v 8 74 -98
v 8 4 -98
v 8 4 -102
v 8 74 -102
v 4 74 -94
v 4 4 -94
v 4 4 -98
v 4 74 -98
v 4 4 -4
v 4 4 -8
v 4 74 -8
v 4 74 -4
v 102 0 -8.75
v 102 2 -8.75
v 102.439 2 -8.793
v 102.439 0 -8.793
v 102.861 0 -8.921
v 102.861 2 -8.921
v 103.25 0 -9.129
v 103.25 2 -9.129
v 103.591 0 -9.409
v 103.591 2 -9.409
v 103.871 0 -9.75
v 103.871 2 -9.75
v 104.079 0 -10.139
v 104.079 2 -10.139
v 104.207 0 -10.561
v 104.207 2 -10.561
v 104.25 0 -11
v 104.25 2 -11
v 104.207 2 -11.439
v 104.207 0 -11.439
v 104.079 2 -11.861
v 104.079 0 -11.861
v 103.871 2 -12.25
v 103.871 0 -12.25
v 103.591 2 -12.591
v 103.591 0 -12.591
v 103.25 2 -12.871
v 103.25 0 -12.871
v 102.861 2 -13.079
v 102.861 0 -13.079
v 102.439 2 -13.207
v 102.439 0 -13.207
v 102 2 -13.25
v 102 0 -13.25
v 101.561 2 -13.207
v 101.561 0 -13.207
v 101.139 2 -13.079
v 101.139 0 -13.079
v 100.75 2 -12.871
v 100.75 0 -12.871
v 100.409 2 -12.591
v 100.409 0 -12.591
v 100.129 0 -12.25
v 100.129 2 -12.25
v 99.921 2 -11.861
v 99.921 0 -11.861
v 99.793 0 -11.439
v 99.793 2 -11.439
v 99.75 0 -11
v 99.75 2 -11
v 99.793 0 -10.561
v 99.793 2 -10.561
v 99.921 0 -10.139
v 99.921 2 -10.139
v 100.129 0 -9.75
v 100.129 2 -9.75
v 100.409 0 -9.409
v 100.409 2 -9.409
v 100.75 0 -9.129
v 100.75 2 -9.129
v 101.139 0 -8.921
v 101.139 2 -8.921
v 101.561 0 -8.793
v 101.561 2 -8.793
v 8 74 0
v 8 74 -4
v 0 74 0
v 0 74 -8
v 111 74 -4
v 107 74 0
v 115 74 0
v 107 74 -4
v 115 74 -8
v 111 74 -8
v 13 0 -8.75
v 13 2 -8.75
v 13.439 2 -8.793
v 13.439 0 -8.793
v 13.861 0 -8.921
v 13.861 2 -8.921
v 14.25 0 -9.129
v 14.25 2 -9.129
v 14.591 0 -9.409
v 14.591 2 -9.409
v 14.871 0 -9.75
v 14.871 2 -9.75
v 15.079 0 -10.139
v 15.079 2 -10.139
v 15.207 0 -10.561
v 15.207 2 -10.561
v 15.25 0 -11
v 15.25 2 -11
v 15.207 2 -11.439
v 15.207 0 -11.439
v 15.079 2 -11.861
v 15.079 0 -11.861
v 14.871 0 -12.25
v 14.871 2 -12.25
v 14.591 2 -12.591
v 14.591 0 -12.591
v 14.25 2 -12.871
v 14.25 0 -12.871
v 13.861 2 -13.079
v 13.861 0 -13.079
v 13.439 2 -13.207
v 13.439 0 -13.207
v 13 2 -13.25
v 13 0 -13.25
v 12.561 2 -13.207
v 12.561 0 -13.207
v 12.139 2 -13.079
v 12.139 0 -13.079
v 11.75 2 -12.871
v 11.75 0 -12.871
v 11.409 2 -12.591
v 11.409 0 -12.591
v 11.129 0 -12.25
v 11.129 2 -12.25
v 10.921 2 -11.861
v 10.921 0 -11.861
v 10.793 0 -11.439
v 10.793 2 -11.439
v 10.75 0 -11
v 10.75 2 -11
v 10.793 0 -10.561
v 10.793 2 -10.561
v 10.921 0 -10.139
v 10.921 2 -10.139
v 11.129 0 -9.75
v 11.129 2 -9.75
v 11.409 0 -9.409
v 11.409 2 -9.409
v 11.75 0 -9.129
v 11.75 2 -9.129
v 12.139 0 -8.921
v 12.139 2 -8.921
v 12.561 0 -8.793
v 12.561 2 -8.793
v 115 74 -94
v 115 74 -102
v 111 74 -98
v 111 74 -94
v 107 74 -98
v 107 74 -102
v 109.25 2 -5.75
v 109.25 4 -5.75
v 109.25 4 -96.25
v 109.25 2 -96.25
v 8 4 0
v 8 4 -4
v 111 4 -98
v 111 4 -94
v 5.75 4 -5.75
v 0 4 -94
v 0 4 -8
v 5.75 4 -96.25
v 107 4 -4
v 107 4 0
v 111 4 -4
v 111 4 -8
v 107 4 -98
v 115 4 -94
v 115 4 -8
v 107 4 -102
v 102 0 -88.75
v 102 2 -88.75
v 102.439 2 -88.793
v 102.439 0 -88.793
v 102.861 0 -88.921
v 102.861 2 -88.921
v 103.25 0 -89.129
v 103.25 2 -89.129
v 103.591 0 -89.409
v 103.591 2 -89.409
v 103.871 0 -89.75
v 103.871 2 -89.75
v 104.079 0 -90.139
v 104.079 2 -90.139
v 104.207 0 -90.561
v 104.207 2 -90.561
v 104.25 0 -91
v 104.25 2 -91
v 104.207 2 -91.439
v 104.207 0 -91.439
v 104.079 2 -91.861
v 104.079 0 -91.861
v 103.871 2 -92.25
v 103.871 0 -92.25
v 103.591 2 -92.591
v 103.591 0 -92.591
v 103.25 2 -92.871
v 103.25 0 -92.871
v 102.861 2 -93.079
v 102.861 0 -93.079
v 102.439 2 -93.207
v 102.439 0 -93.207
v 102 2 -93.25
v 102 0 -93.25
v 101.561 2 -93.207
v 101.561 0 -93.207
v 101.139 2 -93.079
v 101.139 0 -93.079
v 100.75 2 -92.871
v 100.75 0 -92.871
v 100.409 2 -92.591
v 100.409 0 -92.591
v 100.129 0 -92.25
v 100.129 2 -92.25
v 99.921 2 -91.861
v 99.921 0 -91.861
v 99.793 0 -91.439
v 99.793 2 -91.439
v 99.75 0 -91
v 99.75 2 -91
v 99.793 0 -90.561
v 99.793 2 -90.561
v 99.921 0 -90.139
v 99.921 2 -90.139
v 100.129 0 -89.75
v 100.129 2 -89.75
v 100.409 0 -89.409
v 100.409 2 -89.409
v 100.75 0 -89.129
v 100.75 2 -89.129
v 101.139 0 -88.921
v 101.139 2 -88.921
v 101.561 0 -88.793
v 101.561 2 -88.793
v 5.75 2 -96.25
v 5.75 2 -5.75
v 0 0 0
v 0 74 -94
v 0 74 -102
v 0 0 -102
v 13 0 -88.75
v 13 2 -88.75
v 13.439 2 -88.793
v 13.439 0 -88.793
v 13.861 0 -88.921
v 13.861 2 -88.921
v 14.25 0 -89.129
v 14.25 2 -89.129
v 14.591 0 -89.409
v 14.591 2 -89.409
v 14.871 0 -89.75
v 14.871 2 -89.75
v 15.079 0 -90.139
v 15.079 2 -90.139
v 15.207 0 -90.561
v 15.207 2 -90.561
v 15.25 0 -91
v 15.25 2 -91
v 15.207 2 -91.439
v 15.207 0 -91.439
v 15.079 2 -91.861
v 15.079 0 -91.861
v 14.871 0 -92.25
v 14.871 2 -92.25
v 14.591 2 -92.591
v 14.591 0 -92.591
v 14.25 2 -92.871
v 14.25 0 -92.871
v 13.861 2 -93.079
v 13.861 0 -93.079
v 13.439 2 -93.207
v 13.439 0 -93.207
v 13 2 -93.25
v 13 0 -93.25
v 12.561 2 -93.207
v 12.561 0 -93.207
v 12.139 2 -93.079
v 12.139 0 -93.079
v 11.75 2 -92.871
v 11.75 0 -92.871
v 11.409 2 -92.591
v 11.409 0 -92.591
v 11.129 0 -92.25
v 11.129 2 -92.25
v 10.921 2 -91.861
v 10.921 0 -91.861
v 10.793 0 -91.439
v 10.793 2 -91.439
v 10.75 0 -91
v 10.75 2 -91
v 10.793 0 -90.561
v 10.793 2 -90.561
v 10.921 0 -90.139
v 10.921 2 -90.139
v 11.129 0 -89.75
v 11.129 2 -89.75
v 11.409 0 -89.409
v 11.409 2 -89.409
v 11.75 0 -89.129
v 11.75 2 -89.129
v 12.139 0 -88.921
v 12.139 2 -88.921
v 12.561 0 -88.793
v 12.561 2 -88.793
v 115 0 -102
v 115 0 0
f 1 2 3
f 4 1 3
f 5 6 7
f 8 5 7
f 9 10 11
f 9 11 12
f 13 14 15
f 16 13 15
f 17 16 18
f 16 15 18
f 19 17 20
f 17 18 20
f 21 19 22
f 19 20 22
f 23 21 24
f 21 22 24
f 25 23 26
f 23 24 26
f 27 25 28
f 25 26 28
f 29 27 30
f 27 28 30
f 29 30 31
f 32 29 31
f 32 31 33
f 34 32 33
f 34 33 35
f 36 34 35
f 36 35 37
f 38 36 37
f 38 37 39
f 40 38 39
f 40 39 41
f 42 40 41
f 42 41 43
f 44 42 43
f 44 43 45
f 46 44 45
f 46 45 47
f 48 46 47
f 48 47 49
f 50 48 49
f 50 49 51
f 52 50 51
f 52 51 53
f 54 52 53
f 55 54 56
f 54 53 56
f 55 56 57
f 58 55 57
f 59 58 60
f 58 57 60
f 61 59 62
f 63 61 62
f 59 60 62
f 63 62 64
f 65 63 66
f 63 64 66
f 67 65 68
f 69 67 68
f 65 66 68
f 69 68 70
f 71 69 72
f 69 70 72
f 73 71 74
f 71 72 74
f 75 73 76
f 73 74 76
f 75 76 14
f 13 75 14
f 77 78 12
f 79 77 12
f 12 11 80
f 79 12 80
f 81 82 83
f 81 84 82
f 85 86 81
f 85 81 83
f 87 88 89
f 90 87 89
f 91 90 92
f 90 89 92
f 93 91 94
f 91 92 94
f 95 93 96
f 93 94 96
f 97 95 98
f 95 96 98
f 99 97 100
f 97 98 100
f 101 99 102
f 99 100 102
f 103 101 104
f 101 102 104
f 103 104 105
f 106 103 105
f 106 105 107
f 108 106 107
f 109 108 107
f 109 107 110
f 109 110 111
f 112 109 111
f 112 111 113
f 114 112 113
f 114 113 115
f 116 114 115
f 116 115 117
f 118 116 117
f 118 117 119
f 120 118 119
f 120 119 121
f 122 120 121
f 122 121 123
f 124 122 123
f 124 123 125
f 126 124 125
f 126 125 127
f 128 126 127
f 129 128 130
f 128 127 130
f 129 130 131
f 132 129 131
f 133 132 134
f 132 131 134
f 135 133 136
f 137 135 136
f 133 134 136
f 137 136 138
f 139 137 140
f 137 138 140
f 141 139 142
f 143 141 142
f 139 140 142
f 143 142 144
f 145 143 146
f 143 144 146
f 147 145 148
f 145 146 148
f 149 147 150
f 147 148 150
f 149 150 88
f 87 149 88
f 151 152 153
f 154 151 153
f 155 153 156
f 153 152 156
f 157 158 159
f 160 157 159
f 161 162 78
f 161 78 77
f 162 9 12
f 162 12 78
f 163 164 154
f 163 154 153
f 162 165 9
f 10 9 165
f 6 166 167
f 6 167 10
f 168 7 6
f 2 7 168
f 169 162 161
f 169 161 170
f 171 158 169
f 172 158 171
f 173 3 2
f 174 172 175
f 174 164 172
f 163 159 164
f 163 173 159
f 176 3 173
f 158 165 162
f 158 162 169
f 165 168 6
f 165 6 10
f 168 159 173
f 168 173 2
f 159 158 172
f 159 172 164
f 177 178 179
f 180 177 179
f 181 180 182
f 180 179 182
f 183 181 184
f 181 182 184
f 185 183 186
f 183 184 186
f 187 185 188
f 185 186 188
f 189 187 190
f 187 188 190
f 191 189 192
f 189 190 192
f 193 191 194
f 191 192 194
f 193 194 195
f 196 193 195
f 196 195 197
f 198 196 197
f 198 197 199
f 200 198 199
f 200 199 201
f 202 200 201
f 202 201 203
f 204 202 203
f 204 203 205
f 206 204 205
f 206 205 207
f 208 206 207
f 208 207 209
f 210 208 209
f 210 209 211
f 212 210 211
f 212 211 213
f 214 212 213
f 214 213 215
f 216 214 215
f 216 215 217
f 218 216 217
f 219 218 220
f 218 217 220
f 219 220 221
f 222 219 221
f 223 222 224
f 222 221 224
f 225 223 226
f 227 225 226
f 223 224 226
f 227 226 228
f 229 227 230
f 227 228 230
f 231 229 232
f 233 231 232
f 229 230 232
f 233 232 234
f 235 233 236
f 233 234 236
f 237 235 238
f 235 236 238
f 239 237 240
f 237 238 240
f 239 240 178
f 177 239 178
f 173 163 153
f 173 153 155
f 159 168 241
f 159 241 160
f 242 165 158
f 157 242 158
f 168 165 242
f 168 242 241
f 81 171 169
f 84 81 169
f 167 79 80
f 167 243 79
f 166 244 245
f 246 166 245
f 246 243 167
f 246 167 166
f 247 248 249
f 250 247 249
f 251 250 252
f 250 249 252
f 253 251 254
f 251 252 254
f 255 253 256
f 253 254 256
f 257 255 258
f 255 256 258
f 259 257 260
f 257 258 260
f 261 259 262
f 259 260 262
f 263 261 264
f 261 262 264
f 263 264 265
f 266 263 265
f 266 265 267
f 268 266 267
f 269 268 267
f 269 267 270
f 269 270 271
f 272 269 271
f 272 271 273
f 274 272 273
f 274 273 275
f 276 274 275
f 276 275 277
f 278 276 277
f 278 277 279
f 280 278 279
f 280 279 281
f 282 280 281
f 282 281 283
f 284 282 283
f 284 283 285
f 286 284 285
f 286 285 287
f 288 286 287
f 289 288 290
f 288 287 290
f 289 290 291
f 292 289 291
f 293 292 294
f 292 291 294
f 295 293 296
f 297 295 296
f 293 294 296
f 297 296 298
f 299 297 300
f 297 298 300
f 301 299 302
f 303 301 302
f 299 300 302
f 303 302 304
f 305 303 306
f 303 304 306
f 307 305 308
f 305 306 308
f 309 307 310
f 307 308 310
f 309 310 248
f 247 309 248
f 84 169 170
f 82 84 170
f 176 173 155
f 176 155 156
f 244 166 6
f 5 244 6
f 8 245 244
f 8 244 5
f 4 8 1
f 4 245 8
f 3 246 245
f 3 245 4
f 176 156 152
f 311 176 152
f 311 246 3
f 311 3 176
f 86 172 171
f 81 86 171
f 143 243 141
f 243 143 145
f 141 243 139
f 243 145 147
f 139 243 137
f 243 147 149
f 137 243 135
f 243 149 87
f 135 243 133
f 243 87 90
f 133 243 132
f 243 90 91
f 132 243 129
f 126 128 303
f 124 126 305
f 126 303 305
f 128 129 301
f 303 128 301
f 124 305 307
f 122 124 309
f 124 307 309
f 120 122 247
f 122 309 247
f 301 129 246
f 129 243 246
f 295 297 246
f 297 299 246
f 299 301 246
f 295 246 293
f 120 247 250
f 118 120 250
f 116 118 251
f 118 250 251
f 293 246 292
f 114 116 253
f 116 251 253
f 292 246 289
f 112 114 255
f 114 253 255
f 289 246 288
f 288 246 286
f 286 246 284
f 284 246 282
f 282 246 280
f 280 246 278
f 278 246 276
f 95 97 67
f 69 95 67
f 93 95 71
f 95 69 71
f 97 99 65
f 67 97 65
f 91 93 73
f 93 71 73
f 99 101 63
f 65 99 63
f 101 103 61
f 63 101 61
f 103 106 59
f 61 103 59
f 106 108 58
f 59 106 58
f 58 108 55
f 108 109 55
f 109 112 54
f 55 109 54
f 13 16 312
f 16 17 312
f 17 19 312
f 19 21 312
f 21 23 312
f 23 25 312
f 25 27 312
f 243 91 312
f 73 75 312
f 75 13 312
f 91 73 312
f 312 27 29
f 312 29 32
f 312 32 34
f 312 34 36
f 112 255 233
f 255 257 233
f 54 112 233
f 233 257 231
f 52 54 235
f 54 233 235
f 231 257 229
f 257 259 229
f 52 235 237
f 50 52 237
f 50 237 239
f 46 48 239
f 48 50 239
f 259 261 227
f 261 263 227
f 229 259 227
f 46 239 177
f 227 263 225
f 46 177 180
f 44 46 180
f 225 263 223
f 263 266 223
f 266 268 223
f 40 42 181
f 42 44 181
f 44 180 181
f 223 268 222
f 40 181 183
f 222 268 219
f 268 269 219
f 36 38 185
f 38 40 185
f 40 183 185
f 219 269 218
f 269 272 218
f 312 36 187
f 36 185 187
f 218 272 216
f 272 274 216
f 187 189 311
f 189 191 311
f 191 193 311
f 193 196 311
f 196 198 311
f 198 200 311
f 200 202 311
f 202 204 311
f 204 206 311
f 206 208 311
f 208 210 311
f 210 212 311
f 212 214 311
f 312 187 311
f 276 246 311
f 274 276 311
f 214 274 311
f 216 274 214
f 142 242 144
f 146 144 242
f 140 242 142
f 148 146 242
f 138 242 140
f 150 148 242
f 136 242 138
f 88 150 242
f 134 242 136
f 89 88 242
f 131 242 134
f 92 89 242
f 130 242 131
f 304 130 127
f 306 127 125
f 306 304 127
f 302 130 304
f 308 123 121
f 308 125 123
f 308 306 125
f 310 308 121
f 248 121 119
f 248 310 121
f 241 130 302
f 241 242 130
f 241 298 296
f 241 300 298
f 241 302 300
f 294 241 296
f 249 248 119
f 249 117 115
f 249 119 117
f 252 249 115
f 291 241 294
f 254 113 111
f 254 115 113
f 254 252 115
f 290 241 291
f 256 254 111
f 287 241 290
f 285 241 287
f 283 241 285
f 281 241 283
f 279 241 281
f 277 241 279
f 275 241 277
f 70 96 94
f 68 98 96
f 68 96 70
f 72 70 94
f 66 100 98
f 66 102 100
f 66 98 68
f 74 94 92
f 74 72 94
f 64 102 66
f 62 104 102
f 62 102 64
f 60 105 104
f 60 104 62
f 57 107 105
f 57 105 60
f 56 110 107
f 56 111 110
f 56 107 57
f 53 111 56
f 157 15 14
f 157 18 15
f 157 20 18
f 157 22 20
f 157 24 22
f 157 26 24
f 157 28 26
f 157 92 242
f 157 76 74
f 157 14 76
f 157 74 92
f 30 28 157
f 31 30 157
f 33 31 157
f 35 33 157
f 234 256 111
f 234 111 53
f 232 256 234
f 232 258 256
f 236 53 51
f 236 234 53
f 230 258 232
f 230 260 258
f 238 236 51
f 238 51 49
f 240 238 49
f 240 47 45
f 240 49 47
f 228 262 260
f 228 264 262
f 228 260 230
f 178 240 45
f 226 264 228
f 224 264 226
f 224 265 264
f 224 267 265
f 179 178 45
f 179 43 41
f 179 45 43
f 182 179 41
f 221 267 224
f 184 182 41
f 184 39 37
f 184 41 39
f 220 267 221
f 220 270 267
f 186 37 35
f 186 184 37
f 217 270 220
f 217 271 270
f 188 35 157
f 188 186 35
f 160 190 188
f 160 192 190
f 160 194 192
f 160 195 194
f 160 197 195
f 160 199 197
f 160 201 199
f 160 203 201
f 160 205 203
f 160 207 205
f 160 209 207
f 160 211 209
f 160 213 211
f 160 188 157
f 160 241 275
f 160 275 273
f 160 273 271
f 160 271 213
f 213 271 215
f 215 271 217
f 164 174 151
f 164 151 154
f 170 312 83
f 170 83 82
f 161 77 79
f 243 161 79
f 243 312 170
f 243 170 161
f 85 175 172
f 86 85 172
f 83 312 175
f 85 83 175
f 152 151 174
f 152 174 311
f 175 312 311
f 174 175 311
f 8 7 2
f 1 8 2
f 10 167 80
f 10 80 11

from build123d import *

# Parameters (mm, degrees)
SKETCH1_W           = 115
SKETCH1_H           = 102
BOSS_EXTRUDE1_DEPTH = 4
SKETCH11_W          = 103.5
SKETCH11_H          = 90.5
CUT_EXTRUDE5_DEPTH  = 2
SKETCH16_R          = 2.25
CUT_EXTRUDE7_DEPTH  = 13
BOSS_EXTRUDE4_DEPTH = 70


with BuildPart() as part:
    # Sketch1 → Boss-Extrude1 (new body)
    with BuildSketch(Plane(origin=(0, 0, 0), x_dir=(1, 0, 0), z_dir=(0, 1, 0))):
        with Locations((57.5, 51)):
            Rectangle(SKETCH1_W, SKETCH1_H)
    extrude(amount=BOSS_EXTRUDE1_DEPTH)

    # Sketch11 → Cut-Extrude5 (cut)
    with BuildSketch(Plane(origin=(0, 4, 0), x_dir=(1, 0, 0), z_dir=(0, 1, 0))):
        with Locations((57.5, 51)):
            Rectangle(SKETCH11_W, SKETCH11_H)
    extrude(amount=-CUT_EXTRUDE5_DEPTH, mode=Mode.SUBTRACT)

    # Sketch16 → Cut-Extrude7 (cut)
    with BuildSketch(Plane(origin=(0, 2, 0), x_dir=(1, 0, 0), z_dir=(0, 1, 0))):
        with Locations(Location((13, 11, 0), (0, 0, 270))):
            Circle(SKETCH16_R)
        with Locations(Location((13, 91, 0), (0, 0, 270))):
            Circle(SKETCH16_R)
        with Locations(Location((102, 91, 0), (0, 0, 270))):
            Circle(SKETCH16_R)
        with Locations(Location((102, 11, 0), (0, 0, 270))):
            Circle(SKETCH16_R)
    extrude(amount=-CUT_EXTRUDE7_DEPTH, mode=Mode.SUBTRACT)

    # Sketch6 → Boss-Extrude4 (add)
    with BuildSketch(Plane(origin=(0, 4, 0), x_dir=(1, 0, 0), z_dir=(0, 1, 0))):
        Polygon((0, 0), (0, 8), (4, 8), (4, 4), (8, 4), (8, 0), align=None)
        Polygon((107, 0), (115, 0), (115, 8), (111, 8), (111, 4), (107, 4), align=None)
        Polygon((107, 102), (115, 102), (115, 94), (111, 94), (111, 98), (107, 98), align=None)
        Polygon((8, 102), (0, 102), (0, 94), (4, 94), (4, 98), (8, 98), align=None)
    extrude(amount=BOSS_EXTRUDE4_DEPTH)


solid = part.part
